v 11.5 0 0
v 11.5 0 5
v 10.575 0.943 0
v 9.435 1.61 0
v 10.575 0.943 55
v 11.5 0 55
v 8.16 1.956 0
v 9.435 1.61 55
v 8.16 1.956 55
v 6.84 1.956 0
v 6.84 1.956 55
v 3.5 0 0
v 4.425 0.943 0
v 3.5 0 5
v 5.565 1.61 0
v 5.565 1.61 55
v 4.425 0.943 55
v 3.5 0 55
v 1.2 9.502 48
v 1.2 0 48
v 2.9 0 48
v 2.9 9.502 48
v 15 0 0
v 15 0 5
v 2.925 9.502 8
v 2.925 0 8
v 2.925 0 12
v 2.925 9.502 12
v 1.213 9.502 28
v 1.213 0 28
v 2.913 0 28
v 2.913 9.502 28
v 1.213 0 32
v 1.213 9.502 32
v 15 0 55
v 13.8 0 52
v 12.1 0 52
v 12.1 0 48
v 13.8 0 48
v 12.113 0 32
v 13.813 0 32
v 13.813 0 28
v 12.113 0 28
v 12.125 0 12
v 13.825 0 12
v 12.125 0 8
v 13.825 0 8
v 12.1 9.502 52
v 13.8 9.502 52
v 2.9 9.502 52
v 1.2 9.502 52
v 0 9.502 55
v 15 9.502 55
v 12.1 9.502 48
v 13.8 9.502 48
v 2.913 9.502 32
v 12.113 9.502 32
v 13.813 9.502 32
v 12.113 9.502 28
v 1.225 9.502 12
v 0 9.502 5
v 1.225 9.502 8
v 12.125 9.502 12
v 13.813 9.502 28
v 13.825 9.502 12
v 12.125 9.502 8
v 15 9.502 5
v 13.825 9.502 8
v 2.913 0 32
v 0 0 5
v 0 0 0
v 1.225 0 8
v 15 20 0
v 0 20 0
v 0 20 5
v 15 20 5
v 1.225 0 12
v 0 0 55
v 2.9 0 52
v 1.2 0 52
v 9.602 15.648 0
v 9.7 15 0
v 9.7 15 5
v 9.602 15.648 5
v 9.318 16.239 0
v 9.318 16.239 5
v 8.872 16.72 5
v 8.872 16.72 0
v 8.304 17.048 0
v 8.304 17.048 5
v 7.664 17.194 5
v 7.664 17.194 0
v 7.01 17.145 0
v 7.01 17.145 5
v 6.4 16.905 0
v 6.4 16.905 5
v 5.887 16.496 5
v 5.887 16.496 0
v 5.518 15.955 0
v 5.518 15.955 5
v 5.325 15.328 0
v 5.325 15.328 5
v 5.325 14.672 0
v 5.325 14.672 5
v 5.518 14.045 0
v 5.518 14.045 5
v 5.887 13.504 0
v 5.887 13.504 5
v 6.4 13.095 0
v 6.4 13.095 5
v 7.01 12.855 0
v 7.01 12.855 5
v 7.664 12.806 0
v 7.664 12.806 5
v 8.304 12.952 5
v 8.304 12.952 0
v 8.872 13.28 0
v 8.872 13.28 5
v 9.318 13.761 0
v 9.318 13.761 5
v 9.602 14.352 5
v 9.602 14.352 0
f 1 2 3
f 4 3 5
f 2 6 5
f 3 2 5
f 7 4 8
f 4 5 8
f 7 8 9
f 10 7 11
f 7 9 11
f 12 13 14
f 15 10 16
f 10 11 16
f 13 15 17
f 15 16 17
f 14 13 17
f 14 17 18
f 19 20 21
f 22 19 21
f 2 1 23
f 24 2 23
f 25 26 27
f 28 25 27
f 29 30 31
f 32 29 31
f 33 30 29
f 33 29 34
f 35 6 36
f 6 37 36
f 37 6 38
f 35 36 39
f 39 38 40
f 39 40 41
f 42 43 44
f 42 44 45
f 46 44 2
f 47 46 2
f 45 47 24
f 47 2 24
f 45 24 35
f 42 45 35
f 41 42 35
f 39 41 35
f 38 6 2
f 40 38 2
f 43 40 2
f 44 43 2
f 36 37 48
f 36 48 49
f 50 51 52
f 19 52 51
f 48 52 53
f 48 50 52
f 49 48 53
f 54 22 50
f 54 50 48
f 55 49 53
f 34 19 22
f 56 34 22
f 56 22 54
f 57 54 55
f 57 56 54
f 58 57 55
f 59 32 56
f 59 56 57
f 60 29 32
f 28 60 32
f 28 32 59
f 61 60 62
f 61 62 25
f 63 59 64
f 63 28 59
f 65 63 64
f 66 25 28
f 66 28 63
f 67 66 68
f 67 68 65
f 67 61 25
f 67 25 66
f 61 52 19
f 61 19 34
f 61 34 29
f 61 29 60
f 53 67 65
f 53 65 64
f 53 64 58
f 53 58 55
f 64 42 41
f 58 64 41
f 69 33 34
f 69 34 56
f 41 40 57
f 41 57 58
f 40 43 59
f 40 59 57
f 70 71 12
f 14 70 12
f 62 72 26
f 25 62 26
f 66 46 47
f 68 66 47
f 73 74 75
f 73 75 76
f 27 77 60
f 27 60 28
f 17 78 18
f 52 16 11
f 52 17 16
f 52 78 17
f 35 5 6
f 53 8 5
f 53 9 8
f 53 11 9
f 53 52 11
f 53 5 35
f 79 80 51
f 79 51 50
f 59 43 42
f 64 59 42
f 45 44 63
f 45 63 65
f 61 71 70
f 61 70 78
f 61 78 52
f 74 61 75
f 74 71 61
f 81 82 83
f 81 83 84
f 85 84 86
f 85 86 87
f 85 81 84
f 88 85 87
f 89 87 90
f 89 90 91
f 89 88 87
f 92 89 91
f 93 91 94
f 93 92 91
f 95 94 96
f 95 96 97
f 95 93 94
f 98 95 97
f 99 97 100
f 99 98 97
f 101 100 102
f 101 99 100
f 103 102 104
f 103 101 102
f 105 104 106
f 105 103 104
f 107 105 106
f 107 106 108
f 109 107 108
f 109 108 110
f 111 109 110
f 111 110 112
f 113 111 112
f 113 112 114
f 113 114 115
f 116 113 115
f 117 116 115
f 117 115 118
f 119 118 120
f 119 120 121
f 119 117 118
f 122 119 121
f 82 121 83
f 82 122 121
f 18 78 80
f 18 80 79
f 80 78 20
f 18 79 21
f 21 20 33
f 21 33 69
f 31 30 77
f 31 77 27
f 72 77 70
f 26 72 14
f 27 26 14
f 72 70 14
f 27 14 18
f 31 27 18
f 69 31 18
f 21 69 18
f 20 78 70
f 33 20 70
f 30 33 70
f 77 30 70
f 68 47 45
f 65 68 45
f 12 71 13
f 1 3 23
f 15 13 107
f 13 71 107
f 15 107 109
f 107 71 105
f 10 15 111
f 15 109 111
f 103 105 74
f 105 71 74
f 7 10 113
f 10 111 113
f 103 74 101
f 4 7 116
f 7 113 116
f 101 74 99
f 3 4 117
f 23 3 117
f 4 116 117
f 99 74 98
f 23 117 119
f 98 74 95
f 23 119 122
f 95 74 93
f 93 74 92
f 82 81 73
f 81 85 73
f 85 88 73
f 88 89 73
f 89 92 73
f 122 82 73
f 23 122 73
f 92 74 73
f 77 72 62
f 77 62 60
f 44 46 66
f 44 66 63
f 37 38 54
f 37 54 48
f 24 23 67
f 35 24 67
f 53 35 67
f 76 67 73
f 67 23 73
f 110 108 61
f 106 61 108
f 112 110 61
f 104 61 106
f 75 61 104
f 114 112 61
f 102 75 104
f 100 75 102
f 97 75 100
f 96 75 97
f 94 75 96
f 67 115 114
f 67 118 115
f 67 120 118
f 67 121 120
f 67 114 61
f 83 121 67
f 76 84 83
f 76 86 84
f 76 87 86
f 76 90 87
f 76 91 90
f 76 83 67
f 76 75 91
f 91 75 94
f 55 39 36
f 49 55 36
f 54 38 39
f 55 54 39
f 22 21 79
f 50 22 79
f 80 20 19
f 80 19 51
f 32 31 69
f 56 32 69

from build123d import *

# Parameters (mm, degrees)
F0_W     = 15
F0_H     = 20
F0_R     = 2.2
F1_DEPTH = 5
F3_W     = 15
F3_H     = 9.501863
F4_DEPTH = 50
F5_DEPTH = 50
F6_W     = 1.7
F6_H     = 4
F7_DEPTH = 25


with BuildPart() as f1:
    # F0 (on Top) → F1 (new body)
    with BuildSketch(Plane.XY):
        with Locations((7.5, 10)):
            Rectangle(F0_W, F0_H)
        with Locations((7.5, 15)):
            Circle(F0_R, mode=Mode.SUBTRACT)
    extrude(amount=F1_DEPTH)

    # F3 (on face) → F4 (join)
    with BuildSketch(Plane.XY.offset(5)):
        with Locations((7.5, 4.750932)):
            Rectangle(F3_W, F3_H)
    extrude(amount=F4_DEPTH)

    # F2 (on face) → F5 (cut, symmetric)
    with BuildSketch(Plane.XY.offset(5)):
        with BuildLine():
            Line((3.5, 0), (11.5, 0))
            ThreePointArc((11.5, 0), (7.5, 2), (3.5, 0))
        make_face()
    extrude(amount=F5_DEPTH, both=True, mode=Mode.SUBTRACT)

    # F6 (on face) → F7 (cut)
    with BuildSketch(Plane.XZ):
        with Locations((2.05, 50)):
            Rectangle(F6_W, F6_H)
        with Locations((12.95, 50)):
            Rectangle(F6_W, F6_H)
        with Locations((2.062654, 30.000004)):
            Rectangle(F6_W, F6_H)
        with Locations((12.962654, 30.000004)):
            Rectangle(F6_W, F6_H)
        with Locations((2.075308, 10.000008)):
            Rectangle(F6_W, F6_H)
        with Locations((12.975308, 10.000008)):
            Rectangle(F6_W, F6_H)
    extrude(amount=-F7_DEPTH, mode=Mode.SUBTRACT)


solid = f1.part
